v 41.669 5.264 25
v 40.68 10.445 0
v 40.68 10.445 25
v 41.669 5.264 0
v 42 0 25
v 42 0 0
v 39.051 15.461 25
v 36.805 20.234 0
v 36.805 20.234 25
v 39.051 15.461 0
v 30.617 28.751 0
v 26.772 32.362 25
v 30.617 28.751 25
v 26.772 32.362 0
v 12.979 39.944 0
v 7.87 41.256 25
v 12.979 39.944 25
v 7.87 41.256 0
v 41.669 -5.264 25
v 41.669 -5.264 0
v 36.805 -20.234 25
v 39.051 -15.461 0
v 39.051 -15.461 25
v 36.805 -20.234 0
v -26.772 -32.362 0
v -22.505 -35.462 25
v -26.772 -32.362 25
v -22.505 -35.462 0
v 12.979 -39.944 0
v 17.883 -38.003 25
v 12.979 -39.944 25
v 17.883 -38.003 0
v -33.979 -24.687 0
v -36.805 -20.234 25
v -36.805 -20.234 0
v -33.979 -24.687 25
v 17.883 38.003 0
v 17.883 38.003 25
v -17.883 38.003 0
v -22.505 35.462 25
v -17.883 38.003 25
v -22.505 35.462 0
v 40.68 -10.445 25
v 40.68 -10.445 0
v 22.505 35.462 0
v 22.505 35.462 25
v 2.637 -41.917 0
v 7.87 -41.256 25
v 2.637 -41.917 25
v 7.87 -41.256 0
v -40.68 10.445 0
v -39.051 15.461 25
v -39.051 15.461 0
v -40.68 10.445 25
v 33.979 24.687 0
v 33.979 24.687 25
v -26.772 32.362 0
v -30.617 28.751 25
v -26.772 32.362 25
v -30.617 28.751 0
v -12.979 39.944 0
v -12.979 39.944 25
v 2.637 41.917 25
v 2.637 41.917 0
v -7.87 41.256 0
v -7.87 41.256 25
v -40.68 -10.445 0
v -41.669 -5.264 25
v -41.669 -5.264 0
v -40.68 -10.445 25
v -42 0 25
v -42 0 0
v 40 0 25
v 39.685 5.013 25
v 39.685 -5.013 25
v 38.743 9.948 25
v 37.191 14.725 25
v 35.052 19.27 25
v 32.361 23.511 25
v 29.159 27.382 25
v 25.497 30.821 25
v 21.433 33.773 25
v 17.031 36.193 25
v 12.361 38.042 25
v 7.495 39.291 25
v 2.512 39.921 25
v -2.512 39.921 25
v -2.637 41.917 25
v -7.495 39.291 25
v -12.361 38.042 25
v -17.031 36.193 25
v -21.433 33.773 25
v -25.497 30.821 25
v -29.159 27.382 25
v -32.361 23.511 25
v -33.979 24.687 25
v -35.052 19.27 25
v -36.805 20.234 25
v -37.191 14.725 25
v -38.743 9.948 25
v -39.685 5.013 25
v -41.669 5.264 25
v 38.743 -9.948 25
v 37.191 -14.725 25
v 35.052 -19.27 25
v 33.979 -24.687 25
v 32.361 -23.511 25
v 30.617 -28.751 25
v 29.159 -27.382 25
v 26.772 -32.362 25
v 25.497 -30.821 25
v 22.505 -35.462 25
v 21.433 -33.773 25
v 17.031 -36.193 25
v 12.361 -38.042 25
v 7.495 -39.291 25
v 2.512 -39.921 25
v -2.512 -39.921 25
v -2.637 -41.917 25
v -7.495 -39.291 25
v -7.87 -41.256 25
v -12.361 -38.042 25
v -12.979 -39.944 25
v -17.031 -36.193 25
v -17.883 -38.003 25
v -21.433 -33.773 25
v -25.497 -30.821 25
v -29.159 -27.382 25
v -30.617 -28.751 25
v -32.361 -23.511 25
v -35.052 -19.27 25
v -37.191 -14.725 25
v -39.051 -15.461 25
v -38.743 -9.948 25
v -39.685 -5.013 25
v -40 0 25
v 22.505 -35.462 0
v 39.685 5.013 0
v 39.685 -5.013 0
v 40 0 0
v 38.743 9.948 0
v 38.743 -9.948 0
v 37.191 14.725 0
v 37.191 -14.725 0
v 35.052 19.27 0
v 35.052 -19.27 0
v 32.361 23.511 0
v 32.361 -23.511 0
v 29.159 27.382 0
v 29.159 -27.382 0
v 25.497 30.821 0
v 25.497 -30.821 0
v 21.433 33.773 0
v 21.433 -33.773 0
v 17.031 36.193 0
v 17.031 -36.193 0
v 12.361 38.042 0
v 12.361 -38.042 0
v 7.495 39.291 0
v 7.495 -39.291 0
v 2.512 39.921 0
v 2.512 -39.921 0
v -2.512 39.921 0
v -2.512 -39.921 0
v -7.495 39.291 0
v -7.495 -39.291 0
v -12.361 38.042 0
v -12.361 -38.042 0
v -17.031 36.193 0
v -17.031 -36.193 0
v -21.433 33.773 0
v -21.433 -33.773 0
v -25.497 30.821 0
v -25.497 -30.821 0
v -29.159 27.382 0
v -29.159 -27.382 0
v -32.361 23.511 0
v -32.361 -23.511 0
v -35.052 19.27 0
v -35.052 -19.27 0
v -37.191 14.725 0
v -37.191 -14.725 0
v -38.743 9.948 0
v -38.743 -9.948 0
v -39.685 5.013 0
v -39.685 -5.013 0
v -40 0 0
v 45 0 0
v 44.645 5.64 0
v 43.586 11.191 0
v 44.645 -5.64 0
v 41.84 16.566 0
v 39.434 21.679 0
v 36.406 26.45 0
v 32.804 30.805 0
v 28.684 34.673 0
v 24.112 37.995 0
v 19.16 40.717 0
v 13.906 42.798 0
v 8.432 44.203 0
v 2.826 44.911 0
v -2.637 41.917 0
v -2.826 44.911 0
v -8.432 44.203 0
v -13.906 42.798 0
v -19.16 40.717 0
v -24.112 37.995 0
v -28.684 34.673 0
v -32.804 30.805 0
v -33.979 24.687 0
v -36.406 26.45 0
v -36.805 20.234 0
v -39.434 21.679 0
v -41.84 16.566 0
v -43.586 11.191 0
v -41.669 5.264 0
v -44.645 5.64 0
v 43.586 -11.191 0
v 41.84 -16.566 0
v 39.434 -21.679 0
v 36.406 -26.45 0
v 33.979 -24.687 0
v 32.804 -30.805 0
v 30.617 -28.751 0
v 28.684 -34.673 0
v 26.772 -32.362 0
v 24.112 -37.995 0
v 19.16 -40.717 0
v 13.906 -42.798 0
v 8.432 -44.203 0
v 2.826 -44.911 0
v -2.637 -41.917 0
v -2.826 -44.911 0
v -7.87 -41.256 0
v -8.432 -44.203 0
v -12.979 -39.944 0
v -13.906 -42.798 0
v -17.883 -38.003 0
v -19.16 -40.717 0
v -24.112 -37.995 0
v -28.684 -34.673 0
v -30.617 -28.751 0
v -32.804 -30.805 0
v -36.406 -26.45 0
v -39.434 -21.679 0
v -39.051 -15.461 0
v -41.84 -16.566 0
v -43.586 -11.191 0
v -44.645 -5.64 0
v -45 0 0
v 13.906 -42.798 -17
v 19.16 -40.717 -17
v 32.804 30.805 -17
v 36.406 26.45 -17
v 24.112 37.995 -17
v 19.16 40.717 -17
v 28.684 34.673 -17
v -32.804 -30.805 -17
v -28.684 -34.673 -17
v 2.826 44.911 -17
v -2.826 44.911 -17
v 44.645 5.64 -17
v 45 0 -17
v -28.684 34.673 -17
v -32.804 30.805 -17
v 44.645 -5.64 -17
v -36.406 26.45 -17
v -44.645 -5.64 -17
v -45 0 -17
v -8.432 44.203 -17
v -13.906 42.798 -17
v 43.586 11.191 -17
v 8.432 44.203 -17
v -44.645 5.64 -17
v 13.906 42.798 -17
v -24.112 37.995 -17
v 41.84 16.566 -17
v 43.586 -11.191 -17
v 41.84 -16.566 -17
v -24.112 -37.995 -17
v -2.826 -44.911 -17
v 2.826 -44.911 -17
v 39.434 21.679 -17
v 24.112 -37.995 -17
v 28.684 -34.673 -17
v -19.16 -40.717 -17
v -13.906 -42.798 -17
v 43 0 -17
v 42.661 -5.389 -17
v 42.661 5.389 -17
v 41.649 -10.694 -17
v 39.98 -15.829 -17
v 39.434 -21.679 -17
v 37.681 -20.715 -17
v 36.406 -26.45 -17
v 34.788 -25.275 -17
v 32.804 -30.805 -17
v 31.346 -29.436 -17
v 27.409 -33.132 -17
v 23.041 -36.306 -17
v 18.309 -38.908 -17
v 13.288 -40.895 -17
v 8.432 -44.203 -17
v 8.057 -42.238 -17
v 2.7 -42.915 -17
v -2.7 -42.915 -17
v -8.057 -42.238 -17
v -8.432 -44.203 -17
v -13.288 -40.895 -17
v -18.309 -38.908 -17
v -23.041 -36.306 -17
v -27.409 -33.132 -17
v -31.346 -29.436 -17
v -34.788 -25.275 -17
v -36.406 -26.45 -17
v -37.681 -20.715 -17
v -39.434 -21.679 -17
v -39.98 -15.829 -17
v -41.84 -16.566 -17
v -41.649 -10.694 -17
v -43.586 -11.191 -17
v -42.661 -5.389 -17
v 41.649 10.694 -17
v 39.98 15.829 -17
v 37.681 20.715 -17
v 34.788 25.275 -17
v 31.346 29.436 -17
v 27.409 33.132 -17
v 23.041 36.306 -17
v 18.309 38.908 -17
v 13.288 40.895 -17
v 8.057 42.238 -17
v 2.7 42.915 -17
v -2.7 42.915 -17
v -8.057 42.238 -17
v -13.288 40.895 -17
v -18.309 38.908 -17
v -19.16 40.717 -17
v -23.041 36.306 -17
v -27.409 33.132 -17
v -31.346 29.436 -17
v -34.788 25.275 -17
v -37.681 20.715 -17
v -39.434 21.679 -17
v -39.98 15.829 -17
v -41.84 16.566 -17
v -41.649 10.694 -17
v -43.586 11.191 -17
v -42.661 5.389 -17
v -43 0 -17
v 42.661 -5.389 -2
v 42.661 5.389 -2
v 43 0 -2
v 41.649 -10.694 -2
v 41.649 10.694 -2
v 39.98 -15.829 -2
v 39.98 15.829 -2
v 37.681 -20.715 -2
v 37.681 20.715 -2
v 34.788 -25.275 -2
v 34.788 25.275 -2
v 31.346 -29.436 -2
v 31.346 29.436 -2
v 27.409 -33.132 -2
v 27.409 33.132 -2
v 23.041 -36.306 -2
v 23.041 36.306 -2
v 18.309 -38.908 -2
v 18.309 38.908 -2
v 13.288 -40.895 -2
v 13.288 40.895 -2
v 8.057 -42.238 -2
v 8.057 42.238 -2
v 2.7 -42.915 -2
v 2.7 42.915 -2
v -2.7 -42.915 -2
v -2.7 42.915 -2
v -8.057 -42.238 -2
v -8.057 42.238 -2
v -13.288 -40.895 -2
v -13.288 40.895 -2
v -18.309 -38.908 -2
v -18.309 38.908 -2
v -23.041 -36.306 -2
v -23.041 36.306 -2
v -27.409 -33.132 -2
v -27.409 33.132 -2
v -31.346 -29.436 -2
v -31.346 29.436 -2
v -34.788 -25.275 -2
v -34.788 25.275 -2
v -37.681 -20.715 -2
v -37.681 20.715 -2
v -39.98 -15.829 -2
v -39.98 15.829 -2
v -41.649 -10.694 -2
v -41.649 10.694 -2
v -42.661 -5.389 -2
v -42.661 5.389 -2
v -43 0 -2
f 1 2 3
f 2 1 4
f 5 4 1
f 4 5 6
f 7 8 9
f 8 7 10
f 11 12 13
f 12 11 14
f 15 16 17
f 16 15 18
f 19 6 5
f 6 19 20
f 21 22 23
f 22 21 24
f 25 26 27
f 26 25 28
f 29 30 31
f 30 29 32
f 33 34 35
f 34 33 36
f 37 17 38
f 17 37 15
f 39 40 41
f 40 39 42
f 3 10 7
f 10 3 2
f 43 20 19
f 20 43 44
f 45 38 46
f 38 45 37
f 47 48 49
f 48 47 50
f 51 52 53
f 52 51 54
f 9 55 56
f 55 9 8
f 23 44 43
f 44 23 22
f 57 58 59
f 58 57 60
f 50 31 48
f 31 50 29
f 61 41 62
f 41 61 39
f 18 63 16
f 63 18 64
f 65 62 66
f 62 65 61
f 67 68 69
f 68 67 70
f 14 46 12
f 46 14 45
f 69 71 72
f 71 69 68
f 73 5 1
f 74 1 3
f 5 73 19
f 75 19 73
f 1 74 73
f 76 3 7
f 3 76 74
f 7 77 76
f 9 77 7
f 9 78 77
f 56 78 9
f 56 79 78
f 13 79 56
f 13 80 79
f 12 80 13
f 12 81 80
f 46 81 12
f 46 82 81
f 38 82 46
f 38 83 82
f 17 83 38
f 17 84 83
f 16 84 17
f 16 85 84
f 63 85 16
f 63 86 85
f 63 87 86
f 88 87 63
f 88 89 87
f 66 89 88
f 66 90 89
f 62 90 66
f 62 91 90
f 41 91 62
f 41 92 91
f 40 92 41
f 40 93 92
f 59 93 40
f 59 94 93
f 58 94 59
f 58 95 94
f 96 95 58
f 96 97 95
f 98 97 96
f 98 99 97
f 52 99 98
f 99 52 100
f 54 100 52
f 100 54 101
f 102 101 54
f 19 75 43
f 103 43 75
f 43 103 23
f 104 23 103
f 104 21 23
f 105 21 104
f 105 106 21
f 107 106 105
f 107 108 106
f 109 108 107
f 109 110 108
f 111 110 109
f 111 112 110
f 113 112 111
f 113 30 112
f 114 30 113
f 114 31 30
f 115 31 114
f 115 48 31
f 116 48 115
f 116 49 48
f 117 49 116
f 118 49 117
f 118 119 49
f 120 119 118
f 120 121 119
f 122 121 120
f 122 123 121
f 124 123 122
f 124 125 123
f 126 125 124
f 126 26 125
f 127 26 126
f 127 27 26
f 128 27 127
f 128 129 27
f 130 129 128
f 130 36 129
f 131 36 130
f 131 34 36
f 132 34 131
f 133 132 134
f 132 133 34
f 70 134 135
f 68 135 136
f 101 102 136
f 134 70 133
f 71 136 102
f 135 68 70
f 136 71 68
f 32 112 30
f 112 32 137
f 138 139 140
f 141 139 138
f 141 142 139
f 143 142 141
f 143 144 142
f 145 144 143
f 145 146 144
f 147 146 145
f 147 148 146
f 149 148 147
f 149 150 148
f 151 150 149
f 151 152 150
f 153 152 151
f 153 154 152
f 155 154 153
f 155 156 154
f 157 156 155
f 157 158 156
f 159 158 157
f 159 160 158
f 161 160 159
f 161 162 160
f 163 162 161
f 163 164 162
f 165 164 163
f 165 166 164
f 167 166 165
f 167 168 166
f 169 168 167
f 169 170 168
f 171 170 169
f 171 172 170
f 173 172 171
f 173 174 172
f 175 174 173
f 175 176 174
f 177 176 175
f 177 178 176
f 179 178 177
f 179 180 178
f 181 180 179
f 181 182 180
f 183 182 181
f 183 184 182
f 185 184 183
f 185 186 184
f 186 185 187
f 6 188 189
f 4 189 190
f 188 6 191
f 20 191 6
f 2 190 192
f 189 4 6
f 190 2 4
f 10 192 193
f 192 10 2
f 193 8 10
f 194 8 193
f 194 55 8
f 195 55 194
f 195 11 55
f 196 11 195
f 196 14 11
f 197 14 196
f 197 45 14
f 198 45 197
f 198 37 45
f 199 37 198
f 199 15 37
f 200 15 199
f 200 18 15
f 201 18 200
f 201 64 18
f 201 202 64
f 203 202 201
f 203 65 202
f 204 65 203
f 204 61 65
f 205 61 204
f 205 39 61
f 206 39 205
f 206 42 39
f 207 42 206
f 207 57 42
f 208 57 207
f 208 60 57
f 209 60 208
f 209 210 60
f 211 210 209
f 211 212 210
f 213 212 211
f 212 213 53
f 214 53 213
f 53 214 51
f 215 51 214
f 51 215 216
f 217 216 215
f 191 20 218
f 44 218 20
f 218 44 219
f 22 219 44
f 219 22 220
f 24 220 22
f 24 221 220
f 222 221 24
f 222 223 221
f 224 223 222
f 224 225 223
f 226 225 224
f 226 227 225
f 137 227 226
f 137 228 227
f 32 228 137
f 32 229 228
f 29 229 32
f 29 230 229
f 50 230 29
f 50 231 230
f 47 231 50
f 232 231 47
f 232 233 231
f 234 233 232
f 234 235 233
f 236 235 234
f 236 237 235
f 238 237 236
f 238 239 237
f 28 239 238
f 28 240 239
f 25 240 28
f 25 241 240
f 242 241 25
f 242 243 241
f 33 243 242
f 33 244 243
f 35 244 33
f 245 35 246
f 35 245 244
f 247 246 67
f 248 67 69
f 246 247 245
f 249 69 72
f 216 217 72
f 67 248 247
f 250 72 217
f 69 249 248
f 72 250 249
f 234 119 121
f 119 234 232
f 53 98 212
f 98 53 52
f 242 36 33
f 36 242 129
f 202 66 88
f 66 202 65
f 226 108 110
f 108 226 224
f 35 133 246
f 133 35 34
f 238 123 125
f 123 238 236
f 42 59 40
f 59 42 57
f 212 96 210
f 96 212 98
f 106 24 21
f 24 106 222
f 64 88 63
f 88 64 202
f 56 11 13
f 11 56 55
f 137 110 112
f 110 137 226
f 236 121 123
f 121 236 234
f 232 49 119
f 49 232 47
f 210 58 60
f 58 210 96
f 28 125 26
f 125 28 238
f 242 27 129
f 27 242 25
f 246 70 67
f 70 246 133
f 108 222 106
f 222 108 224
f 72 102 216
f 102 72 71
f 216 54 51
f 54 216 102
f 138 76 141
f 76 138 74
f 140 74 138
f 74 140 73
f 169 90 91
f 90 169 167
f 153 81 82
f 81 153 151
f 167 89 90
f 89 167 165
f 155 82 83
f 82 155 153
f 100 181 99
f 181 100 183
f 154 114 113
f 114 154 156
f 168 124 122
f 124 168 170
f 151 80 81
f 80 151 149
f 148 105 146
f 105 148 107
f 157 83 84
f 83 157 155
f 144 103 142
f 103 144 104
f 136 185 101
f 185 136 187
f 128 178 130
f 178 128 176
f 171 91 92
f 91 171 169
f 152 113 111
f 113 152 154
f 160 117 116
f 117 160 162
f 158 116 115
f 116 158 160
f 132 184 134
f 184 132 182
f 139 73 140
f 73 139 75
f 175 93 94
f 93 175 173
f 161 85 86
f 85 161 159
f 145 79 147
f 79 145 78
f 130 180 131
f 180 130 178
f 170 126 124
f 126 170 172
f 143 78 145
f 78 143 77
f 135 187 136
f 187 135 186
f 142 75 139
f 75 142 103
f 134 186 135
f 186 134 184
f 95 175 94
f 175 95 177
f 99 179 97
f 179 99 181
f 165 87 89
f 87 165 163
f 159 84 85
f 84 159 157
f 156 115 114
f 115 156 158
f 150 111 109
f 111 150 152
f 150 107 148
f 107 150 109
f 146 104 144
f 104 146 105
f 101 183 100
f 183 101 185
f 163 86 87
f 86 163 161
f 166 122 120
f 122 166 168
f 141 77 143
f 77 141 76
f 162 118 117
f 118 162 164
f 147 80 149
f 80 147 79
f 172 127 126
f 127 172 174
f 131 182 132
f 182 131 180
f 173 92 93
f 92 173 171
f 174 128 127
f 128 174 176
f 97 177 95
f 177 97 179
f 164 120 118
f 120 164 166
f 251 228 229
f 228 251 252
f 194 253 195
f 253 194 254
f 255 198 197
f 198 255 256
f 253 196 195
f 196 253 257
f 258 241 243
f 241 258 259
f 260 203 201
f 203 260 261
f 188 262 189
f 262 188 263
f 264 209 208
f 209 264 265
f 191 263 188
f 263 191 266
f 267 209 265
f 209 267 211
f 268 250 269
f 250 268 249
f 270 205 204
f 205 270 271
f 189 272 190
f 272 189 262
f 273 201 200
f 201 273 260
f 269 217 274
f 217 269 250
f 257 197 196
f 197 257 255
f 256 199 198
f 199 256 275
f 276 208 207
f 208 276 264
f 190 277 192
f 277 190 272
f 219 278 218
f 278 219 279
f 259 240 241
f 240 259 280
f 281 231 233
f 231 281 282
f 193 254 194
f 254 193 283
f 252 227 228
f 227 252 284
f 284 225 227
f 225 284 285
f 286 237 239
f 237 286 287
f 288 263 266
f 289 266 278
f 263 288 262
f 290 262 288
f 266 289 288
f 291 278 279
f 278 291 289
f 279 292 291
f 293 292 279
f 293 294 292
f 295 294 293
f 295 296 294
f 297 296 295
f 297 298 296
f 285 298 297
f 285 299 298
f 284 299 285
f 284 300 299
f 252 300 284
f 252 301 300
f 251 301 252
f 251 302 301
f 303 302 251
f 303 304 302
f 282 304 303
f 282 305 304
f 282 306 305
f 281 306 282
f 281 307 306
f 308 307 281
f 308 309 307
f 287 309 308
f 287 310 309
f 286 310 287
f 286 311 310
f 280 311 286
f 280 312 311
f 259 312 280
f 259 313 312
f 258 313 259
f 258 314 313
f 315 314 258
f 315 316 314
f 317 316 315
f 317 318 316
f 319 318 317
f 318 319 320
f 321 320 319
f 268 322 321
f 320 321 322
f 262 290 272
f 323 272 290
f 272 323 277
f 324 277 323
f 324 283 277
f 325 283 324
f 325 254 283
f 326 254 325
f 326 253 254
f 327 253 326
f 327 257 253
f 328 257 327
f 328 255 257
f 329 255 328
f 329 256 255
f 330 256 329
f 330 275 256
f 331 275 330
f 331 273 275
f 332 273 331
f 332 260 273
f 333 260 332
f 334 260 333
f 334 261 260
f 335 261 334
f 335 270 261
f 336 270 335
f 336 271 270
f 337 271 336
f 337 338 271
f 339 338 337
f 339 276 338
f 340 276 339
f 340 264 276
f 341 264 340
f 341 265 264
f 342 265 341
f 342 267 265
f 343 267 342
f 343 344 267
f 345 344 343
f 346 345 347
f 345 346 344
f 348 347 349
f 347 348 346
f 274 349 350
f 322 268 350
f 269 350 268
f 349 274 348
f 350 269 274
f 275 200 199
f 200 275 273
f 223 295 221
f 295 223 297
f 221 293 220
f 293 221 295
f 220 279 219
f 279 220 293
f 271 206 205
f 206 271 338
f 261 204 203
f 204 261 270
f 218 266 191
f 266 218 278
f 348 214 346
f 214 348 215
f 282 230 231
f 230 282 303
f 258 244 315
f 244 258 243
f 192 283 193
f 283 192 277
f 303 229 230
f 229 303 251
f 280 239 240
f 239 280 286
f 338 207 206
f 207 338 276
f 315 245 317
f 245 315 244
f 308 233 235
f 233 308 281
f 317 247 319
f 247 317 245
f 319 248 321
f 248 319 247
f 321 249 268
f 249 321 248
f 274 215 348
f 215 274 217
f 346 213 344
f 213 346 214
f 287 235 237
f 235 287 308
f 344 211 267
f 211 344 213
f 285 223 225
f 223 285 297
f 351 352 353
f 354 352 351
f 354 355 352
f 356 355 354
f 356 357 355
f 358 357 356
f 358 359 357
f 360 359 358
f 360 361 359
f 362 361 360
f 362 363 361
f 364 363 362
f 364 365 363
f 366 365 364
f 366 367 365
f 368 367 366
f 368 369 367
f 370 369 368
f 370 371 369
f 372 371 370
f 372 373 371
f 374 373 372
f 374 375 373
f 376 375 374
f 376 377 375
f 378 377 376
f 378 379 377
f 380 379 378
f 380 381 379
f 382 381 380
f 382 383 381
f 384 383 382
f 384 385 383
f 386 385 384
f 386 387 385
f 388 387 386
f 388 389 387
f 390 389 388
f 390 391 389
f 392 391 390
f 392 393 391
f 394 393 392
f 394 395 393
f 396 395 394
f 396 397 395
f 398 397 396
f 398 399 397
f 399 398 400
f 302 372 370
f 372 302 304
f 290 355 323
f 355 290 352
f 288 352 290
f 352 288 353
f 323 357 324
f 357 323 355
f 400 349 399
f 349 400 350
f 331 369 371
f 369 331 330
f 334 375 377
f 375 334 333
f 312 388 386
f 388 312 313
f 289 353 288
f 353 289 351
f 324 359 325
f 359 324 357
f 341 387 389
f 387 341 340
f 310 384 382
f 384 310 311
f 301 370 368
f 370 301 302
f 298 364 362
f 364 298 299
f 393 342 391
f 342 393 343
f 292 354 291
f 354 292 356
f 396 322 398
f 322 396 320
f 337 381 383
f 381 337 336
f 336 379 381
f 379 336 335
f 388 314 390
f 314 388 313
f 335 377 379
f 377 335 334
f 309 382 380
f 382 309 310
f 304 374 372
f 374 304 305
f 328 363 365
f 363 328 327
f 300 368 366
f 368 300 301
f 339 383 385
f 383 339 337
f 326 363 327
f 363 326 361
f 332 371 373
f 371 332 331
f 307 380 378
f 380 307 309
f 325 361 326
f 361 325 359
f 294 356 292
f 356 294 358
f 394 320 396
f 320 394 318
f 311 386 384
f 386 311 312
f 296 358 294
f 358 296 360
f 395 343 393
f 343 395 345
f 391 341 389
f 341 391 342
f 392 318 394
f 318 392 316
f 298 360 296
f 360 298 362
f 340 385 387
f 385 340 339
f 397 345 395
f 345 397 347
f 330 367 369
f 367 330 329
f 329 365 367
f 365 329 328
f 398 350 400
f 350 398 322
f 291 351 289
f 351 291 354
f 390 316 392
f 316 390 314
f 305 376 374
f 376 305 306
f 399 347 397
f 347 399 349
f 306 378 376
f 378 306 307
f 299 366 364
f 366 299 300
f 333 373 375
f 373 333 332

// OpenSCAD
// Inside diameter of the opening that will hold your cup, in mm
cup_diameter = 80;
// Height of the inside of the opening that will hold your cup, in mm
cup_height = 25;
// Thickness of the printed walls, in mm
wall_thickness = 2;
// Diameter of the post that this will slip over, in mm
post_diameter = 86;
// Height of the post covered by holder, in mm
post_height = 15;

$fn=50;

module ring(inner_diameter, height, thickness)
{
	difference()
	{
		cylinder(h = height, r = inner_diameter / 2 + wall_thickness);
		translate(v=[0, 0, -.01])
			cylinder(h = height + .02, r = inner_diameter / 2);
	}
}

module cup(cup_diameter, cup_height, post_diameter, post_height, wall_thickness)
{
	ring(cup_diameter, cup_height);
	translate(v=[0, 0, -post_height - wall_thickness])
		ring(post_diameter, post_height, wall_thickness);

	plate_diameter = max(cup_diameter, post_diameter) + 2 * wall_thickness;
	translate(v = [0, 0, -wall_thickness])
		cylinder(h = wall_thickness, r = plate_diameter / 2);
}

cup(cup_diameter, cup_height, post_diameter, post_height, wall_thickness);
